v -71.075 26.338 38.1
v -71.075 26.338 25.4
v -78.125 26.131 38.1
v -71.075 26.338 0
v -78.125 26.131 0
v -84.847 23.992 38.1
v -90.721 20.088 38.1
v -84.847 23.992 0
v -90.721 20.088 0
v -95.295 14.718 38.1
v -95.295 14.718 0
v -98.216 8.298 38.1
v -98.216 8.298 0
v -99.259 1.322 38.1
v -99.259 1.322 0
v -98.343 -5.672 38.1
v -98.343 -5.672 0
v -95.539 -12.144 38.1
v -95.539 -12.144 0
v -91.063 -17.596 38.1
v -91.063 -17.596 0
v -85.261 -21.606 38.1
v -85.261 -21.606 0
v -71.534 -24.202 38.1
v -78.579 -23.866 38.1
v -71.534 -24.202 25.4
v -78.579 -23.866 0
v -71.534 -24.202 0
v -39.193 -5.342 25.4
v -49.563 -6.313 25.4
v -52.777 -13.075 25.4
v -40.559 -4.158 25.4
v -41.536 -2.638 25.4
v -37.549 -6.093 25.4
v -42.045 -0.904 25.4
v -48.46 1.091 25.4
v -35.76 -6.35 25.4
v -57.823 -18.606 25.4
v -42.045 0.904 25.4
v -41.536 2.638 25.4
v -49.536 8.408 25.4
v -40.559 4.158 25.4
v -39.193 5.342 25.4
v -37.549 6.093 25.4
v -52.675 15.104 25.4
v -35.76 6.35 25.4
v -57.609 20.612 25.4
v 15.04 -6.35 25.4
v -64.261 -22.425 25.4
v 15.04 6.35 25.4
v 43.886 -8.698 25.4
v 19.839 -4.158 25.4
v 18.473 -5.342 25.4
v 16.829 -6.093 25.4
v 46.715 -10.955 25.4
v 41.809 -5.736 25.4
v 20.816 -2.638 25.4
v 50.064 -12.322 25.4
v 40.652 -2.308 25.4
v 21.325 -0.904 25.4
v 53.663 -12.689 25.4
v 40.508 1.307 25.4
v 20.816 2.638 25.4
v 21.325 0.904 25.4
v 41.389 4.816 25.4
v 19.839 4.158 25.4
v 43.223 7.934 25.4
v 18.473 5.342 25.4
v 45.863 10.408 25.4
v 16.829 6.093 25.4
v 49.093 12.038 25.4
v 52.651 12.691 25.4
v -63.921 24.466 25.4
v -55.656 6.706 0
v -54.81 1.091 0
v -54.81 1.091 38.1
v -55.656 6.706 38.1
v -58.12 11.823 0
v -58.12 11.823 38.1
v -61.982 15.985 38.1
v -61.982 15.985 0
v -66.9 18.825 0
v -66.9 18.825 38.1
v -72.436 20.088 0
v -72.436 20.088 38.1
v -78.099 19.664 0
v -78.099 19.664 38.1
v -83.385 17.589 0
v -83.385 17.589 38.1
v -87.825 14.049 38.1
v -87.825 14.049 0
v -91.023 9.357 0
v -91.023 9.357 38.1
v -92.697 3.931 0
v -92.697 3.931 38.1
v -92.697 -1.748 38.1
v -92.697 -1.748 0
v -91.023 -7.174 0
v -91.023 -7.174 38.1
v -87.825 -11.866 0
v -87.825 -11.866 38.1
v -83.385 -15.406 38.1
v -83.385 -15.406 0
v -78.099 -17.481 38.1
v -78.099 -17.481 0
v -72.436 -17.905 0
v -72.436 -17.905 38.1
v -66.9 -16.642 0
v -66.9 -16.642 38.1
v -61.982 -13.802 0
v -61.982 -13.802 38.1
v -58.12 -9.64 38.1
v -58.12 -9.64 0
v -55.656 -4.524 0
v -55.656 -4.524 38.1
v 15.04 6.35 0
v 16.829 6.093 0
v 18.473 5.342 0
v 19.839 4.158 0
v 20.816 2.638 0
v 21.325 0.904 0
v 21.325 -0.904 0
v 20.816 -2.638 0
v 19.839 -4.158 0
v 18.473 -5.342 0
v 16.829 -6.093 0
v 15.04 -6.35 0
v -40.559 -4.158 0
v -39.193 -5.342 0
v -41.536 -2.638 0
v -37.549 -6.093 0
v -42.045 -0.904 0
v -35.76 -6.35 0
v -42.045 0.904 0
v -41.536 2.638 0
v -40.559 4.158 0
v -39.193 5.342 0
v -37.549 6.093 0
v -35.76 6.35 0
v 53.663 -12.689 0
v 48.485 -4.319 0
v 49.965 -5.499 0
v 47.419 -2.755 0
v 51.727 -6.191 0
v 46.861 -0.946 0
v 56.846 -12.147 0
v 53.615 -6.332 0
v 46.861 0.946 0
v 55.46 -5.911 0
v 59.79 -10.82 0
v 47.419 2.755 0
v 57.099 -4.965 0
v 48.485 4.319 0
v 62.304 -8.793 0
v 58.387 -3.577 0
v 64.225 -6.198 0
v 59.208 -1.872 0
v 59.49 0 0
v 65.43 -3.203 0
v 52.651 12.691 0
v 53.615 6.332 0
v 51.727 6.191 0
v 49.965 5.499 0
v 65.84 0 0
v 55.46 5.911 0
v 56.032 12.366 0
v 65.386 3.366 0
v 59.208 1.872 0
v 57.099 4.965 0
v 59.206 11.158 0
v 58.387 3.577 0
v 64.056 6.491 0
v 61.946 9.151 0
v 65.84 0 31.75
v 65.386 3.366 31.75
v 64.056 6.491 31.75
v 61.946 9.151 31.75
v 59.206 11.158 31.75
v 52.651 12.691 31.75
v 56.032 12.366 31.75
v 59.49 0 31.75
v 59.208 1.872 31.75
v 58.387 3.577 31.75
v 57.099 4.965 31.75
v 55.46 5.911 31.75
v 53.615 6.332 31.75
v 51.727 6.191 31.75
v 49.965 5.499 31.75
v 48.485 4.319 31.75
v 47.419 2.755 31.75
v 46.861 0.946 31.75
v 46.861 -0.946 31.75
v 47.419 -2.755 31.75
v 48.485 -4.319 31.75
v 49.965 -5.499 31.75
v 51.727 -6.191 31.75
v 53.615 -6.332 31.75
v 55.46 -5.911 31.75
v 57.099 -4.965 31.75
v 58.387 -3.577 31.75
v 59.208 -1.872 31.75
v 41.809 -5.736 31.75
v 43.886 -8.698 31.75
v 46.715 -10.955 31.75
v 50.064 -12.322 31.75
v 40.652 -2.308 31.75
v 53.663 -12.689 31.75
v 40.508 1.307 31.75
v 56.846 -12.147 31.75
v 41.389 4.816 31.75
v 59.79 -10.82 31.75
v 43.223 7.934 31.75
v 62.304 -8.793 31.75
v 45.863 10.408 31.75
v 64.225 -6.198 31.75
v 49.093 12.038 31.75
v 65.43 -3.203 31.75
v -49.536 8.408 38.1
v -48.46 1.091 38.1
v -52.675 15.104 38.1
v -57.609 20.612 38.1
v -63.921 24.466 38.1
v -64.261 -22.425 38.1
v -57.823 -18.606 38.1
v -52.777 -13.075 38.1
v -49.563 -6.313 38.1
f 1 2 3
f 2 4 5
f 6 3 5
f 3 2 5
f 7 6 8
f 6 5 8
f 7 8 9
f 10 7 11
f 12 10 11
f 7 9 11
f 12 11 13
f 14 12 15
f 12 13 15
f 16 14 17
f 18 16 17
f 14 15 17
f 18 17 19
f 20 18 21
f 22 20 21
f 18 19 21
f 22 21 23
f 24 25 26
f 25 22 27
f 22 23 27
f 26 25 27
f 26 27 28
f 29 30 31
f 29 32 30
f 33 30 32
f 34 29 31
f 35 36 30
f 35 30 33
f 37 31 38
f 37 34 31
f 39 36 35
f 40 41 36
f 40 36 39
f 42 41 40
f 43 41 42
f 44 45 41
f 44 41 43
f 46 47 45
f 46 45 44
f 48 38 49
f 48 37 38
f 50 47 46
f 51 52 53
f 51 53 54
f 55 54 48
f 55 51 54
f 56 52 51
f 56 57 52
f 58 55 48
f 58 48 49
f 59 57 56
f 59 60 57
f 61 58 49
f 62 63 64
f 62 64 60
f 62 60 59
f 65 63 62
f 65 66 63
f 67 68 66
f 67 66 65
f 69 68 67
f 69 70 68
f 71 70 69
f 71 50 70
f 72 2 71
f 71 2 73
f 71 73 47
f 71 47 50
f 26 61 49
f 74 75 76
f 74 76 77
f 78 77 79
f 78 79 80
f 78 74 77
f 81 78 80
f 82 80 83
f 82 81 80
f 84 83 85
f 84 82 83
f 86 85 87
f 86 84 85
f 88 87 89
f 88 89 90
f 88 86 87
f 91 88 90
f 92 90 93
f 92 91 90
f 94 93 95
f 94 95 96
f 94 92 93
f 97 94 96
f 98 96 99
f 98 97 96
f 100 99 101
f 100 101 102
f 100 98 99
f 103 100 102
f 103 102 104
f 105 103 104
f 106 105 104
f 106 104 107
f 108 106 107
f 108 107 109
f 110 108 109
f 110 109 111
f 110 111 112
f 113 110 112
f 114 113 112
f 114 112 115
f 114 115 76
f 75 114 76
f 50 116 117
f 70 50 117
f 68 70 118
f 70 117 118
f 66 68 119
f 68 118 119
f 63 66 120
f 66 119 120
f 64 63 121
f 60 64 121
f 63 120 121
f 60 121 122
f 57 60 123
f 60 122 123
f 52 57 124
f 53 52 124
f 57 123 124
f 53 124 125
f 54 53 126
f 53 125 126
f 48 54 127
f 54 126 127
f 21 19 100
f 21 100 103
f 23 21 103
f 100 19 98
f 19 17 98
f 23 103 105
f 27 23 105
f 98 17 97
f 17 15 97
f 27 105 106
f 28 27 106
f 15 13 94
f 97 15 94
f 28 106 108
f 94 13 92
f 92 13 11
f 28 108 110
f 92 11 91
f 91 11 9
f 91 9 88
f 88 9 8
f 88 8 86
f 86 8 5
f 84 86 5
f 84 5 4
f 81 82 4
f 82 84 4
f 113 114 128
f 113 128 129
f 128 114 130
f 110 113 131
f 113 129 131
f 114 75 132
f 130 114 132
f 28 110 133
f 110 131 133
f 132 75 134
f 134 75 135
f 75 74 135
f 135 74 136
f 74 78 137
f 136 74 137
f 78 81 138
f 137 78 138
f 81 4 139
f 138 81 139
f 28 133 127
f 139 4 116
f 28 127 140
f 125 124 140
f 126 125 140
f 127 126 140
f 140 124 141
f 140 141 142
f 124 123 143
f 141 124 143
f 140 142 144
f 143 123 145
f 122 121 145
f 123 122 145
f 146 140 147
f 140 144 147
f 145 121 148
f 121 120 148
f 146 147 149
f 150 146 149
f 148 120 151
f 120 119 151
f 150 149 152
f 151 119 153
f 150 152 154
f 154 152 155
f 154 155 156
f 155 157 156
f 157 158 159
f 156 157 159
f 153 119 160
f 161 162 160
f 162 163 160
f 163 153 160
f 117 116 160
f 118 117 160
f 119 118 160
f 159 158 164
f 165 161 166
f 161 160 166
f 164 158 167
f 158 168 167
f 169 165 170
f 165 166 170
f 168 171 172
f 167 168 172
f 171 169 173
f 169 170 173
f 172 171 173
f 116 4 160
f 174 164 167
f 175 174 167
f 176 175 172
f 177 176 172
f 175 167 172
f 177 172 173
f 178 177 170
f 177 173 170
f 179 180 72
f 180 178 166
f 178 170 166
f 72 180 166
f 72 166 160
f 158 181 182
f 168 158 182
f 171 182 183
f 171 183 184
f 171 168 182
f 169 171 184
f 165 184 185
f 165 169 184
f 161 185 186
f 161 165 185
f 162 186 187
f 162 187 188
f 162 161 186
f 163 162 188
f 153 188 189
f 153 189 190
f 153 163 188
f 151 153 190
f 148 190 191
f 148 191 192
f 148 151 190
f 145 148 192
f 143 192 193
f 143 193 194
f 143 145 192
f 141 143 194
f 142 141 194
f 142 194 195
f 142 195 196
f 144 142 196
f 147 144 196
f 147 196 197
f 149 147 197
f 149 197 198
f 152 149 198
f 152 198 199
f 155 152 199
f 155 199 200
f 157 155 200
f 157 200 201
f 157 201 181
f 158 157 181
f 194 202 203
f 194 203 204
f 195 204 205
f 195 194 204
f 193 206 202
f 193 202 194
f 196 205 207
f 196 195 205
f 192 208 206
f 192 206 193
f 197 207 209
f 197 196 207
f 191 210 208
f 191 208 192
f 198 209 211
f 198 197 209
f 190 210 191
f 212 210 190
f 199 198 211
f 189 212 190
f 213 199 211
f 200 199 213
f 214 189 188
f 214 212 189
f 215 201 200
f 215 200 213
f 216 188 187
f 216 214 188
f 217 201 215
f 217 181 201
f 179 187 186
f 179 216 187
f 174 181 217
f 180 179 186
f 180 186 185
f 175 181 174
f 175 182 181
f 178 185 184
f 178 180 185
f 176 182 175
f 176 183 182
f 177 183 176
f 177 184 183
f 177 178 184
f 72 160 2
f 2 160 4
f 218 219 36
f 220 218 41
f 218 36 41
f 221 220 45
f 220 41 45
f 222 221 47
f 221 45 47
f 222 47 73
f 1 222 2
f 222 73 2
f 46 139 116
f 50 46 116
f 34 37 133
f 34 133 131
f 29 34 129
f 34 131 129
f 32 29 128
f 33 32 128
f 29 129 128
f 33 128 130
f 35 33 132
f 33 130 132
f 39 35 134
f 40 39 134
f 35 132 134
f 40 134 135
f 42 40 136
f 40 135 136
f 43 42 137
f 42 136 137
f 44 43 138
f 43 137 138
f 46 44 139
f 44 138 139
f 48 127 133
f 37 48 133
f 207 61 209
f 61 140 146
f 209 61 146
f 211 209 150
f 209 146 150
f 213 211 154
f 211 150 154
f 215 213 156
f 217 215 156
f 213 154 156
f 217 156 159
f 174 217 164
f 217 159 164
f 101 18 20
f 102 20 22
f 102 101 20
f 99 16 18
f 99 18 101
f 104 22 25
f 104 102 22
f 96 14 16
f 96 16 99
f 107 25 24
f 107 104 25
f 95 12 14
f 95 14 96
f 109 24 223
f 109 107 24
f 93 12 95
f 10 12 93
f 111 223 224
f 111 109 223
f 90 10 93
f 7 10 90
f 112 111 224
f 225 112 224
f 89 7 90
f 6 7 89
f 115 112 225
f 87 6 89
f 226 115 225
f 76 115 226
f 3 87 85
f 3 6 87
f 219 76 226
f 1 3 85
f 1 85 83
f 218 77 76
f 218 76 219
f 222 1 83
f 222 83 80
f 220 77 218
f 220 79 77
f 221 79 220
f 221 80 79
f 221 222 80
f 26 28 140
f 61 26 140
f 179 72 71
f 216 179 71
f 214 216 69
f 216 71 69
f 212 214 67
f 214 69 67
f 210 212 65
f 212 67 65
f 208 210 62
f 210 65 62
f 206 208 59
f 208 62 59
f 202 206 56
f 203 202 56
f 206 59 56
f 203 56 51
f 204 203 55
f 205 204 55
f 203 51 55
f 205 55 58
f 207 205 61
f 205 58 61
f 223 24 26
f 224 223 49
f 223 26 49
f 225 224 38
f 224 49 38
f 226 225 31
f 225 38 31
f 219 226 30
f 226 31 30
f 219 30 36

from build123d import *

# Parameters (mm, degrees)
F0_R     = 19.05
F0_R_2   = 6.35
F1_DEPTH = 25.4
F2_DEPTH = 38.1
F3_DEPTH = 31.75


with BuildPart() as f1:
    # F0 (on Top) → F1 (new body)
    with BuildSketch(Plane.XY):
        with BuildLine():
            ThreePointArc((-71.533995, -24.201889), (-55.095046, -16.027055), (-48.459869, 1.091397))
            ThreePointArc((-48.459869, 1.091397), (-54.940362, 18.038734), (-71.075007, 26.338268))
            ThreePointArc((-71.075007, 26.338268), (-99.258822, 1.322061), (-71.533995, -24.201889))
        make_face()
        with Locations((-73.859869, 1.091397)):
            Circle(F0_R, mode=Mode.SUBTRACT)
        with BuildLine():
            ThreePointArc((65.840131, 0), (61.945909, 9.151408), (52.651428, 12.690594))
            ThreePointArc((52.651428, 12.690594), (40.450213, -0.505965), (53.663357, -12.689217))
            ThreePointArc((53.663357, -12.689217), (62.303508, -8.793322), (65.840131, 0))
        make_face()
        with Locations((53.140131, 0)):
            Circle(F0_R_2, mode=Mode.SUBTRACT)
        with BuildLine():
            ThreePointArc((-71.075007, 26.338268), (-54.940362, 18.038734), (-48.459869, 1.091397))
            ThreePointArc((-48.459869, 1.091397), (-55.095046, -16.027055), (-71.533995, -24.201889))
            Line((-71.533995, -24.201889), (53.663357, -12.689217))
            ThreePointArc((53.663357, -12.689217), (40.450213, -0.505965), (52.651428, 12.690594))
            Line((52.651428, 12.690594), (-71.075007, 26.338268))
        make_face()
        with BuildLine():
            ThreePointArc((15.040131, 6.35), (21.390131, 0), (15.040131, -6.35))
            Line((15.040131, -6.35), (-35.759869, -6.35))
            ThreePointArc((-35.759869, -6.35), (-42.109869, 0), (-35.759869, 6.35))
            Line((-35.759869, 6.35), (15.040131, 6.35))
        make_face(mode=Mode.SUBTRACT)
    extrude(amount=F1_DEPTH)

    # F0 (on Top) → F2 (join)
    with BuildSketch(Plane.XY):
        with BuildLine():
            ThreePointArc((-71.533995, -24.201889), (-55.095046, -16.027055), (-48.459869, 1.091397))
            ThreePointArc((-48.459869, 1.091397), (-54.940362, 18.038734), (-71.075007, 26.338268))
            ThreePointArc((-71.075007, 26.338268), (-99.258822, 1.322061), (-71.533995, -24.201889))
        make_face()
        with Locations((-73.859869, 1.091397)):
            Circle(F0_R, mode=Mode.SUBTRACT)
    extrude(amount=F2_DEPTH)

    # F0 (on Top) → F3 (join)
    with BuildSketch(Plane.XY):
        with BuildLine():
            ThreePointArc((65.840131, 0), (61.945909, 9.151408), (52.651428, 12.690594))
            ThreePointArc((52.651428, 12.690594), (40.450213, -0.505965), (53.663357, -12.689217))
            ThreePointArc((53.663357, -12.689217), (62.303508, -8.793322), (65.840131, 0))
        make_face()
        with Locations((53.140131, 0)):
            Circle(F0_R_2, mode=Mode.SUBTRACT)
    extrude(amount=F3_DEPTH)


solid = f1.part
